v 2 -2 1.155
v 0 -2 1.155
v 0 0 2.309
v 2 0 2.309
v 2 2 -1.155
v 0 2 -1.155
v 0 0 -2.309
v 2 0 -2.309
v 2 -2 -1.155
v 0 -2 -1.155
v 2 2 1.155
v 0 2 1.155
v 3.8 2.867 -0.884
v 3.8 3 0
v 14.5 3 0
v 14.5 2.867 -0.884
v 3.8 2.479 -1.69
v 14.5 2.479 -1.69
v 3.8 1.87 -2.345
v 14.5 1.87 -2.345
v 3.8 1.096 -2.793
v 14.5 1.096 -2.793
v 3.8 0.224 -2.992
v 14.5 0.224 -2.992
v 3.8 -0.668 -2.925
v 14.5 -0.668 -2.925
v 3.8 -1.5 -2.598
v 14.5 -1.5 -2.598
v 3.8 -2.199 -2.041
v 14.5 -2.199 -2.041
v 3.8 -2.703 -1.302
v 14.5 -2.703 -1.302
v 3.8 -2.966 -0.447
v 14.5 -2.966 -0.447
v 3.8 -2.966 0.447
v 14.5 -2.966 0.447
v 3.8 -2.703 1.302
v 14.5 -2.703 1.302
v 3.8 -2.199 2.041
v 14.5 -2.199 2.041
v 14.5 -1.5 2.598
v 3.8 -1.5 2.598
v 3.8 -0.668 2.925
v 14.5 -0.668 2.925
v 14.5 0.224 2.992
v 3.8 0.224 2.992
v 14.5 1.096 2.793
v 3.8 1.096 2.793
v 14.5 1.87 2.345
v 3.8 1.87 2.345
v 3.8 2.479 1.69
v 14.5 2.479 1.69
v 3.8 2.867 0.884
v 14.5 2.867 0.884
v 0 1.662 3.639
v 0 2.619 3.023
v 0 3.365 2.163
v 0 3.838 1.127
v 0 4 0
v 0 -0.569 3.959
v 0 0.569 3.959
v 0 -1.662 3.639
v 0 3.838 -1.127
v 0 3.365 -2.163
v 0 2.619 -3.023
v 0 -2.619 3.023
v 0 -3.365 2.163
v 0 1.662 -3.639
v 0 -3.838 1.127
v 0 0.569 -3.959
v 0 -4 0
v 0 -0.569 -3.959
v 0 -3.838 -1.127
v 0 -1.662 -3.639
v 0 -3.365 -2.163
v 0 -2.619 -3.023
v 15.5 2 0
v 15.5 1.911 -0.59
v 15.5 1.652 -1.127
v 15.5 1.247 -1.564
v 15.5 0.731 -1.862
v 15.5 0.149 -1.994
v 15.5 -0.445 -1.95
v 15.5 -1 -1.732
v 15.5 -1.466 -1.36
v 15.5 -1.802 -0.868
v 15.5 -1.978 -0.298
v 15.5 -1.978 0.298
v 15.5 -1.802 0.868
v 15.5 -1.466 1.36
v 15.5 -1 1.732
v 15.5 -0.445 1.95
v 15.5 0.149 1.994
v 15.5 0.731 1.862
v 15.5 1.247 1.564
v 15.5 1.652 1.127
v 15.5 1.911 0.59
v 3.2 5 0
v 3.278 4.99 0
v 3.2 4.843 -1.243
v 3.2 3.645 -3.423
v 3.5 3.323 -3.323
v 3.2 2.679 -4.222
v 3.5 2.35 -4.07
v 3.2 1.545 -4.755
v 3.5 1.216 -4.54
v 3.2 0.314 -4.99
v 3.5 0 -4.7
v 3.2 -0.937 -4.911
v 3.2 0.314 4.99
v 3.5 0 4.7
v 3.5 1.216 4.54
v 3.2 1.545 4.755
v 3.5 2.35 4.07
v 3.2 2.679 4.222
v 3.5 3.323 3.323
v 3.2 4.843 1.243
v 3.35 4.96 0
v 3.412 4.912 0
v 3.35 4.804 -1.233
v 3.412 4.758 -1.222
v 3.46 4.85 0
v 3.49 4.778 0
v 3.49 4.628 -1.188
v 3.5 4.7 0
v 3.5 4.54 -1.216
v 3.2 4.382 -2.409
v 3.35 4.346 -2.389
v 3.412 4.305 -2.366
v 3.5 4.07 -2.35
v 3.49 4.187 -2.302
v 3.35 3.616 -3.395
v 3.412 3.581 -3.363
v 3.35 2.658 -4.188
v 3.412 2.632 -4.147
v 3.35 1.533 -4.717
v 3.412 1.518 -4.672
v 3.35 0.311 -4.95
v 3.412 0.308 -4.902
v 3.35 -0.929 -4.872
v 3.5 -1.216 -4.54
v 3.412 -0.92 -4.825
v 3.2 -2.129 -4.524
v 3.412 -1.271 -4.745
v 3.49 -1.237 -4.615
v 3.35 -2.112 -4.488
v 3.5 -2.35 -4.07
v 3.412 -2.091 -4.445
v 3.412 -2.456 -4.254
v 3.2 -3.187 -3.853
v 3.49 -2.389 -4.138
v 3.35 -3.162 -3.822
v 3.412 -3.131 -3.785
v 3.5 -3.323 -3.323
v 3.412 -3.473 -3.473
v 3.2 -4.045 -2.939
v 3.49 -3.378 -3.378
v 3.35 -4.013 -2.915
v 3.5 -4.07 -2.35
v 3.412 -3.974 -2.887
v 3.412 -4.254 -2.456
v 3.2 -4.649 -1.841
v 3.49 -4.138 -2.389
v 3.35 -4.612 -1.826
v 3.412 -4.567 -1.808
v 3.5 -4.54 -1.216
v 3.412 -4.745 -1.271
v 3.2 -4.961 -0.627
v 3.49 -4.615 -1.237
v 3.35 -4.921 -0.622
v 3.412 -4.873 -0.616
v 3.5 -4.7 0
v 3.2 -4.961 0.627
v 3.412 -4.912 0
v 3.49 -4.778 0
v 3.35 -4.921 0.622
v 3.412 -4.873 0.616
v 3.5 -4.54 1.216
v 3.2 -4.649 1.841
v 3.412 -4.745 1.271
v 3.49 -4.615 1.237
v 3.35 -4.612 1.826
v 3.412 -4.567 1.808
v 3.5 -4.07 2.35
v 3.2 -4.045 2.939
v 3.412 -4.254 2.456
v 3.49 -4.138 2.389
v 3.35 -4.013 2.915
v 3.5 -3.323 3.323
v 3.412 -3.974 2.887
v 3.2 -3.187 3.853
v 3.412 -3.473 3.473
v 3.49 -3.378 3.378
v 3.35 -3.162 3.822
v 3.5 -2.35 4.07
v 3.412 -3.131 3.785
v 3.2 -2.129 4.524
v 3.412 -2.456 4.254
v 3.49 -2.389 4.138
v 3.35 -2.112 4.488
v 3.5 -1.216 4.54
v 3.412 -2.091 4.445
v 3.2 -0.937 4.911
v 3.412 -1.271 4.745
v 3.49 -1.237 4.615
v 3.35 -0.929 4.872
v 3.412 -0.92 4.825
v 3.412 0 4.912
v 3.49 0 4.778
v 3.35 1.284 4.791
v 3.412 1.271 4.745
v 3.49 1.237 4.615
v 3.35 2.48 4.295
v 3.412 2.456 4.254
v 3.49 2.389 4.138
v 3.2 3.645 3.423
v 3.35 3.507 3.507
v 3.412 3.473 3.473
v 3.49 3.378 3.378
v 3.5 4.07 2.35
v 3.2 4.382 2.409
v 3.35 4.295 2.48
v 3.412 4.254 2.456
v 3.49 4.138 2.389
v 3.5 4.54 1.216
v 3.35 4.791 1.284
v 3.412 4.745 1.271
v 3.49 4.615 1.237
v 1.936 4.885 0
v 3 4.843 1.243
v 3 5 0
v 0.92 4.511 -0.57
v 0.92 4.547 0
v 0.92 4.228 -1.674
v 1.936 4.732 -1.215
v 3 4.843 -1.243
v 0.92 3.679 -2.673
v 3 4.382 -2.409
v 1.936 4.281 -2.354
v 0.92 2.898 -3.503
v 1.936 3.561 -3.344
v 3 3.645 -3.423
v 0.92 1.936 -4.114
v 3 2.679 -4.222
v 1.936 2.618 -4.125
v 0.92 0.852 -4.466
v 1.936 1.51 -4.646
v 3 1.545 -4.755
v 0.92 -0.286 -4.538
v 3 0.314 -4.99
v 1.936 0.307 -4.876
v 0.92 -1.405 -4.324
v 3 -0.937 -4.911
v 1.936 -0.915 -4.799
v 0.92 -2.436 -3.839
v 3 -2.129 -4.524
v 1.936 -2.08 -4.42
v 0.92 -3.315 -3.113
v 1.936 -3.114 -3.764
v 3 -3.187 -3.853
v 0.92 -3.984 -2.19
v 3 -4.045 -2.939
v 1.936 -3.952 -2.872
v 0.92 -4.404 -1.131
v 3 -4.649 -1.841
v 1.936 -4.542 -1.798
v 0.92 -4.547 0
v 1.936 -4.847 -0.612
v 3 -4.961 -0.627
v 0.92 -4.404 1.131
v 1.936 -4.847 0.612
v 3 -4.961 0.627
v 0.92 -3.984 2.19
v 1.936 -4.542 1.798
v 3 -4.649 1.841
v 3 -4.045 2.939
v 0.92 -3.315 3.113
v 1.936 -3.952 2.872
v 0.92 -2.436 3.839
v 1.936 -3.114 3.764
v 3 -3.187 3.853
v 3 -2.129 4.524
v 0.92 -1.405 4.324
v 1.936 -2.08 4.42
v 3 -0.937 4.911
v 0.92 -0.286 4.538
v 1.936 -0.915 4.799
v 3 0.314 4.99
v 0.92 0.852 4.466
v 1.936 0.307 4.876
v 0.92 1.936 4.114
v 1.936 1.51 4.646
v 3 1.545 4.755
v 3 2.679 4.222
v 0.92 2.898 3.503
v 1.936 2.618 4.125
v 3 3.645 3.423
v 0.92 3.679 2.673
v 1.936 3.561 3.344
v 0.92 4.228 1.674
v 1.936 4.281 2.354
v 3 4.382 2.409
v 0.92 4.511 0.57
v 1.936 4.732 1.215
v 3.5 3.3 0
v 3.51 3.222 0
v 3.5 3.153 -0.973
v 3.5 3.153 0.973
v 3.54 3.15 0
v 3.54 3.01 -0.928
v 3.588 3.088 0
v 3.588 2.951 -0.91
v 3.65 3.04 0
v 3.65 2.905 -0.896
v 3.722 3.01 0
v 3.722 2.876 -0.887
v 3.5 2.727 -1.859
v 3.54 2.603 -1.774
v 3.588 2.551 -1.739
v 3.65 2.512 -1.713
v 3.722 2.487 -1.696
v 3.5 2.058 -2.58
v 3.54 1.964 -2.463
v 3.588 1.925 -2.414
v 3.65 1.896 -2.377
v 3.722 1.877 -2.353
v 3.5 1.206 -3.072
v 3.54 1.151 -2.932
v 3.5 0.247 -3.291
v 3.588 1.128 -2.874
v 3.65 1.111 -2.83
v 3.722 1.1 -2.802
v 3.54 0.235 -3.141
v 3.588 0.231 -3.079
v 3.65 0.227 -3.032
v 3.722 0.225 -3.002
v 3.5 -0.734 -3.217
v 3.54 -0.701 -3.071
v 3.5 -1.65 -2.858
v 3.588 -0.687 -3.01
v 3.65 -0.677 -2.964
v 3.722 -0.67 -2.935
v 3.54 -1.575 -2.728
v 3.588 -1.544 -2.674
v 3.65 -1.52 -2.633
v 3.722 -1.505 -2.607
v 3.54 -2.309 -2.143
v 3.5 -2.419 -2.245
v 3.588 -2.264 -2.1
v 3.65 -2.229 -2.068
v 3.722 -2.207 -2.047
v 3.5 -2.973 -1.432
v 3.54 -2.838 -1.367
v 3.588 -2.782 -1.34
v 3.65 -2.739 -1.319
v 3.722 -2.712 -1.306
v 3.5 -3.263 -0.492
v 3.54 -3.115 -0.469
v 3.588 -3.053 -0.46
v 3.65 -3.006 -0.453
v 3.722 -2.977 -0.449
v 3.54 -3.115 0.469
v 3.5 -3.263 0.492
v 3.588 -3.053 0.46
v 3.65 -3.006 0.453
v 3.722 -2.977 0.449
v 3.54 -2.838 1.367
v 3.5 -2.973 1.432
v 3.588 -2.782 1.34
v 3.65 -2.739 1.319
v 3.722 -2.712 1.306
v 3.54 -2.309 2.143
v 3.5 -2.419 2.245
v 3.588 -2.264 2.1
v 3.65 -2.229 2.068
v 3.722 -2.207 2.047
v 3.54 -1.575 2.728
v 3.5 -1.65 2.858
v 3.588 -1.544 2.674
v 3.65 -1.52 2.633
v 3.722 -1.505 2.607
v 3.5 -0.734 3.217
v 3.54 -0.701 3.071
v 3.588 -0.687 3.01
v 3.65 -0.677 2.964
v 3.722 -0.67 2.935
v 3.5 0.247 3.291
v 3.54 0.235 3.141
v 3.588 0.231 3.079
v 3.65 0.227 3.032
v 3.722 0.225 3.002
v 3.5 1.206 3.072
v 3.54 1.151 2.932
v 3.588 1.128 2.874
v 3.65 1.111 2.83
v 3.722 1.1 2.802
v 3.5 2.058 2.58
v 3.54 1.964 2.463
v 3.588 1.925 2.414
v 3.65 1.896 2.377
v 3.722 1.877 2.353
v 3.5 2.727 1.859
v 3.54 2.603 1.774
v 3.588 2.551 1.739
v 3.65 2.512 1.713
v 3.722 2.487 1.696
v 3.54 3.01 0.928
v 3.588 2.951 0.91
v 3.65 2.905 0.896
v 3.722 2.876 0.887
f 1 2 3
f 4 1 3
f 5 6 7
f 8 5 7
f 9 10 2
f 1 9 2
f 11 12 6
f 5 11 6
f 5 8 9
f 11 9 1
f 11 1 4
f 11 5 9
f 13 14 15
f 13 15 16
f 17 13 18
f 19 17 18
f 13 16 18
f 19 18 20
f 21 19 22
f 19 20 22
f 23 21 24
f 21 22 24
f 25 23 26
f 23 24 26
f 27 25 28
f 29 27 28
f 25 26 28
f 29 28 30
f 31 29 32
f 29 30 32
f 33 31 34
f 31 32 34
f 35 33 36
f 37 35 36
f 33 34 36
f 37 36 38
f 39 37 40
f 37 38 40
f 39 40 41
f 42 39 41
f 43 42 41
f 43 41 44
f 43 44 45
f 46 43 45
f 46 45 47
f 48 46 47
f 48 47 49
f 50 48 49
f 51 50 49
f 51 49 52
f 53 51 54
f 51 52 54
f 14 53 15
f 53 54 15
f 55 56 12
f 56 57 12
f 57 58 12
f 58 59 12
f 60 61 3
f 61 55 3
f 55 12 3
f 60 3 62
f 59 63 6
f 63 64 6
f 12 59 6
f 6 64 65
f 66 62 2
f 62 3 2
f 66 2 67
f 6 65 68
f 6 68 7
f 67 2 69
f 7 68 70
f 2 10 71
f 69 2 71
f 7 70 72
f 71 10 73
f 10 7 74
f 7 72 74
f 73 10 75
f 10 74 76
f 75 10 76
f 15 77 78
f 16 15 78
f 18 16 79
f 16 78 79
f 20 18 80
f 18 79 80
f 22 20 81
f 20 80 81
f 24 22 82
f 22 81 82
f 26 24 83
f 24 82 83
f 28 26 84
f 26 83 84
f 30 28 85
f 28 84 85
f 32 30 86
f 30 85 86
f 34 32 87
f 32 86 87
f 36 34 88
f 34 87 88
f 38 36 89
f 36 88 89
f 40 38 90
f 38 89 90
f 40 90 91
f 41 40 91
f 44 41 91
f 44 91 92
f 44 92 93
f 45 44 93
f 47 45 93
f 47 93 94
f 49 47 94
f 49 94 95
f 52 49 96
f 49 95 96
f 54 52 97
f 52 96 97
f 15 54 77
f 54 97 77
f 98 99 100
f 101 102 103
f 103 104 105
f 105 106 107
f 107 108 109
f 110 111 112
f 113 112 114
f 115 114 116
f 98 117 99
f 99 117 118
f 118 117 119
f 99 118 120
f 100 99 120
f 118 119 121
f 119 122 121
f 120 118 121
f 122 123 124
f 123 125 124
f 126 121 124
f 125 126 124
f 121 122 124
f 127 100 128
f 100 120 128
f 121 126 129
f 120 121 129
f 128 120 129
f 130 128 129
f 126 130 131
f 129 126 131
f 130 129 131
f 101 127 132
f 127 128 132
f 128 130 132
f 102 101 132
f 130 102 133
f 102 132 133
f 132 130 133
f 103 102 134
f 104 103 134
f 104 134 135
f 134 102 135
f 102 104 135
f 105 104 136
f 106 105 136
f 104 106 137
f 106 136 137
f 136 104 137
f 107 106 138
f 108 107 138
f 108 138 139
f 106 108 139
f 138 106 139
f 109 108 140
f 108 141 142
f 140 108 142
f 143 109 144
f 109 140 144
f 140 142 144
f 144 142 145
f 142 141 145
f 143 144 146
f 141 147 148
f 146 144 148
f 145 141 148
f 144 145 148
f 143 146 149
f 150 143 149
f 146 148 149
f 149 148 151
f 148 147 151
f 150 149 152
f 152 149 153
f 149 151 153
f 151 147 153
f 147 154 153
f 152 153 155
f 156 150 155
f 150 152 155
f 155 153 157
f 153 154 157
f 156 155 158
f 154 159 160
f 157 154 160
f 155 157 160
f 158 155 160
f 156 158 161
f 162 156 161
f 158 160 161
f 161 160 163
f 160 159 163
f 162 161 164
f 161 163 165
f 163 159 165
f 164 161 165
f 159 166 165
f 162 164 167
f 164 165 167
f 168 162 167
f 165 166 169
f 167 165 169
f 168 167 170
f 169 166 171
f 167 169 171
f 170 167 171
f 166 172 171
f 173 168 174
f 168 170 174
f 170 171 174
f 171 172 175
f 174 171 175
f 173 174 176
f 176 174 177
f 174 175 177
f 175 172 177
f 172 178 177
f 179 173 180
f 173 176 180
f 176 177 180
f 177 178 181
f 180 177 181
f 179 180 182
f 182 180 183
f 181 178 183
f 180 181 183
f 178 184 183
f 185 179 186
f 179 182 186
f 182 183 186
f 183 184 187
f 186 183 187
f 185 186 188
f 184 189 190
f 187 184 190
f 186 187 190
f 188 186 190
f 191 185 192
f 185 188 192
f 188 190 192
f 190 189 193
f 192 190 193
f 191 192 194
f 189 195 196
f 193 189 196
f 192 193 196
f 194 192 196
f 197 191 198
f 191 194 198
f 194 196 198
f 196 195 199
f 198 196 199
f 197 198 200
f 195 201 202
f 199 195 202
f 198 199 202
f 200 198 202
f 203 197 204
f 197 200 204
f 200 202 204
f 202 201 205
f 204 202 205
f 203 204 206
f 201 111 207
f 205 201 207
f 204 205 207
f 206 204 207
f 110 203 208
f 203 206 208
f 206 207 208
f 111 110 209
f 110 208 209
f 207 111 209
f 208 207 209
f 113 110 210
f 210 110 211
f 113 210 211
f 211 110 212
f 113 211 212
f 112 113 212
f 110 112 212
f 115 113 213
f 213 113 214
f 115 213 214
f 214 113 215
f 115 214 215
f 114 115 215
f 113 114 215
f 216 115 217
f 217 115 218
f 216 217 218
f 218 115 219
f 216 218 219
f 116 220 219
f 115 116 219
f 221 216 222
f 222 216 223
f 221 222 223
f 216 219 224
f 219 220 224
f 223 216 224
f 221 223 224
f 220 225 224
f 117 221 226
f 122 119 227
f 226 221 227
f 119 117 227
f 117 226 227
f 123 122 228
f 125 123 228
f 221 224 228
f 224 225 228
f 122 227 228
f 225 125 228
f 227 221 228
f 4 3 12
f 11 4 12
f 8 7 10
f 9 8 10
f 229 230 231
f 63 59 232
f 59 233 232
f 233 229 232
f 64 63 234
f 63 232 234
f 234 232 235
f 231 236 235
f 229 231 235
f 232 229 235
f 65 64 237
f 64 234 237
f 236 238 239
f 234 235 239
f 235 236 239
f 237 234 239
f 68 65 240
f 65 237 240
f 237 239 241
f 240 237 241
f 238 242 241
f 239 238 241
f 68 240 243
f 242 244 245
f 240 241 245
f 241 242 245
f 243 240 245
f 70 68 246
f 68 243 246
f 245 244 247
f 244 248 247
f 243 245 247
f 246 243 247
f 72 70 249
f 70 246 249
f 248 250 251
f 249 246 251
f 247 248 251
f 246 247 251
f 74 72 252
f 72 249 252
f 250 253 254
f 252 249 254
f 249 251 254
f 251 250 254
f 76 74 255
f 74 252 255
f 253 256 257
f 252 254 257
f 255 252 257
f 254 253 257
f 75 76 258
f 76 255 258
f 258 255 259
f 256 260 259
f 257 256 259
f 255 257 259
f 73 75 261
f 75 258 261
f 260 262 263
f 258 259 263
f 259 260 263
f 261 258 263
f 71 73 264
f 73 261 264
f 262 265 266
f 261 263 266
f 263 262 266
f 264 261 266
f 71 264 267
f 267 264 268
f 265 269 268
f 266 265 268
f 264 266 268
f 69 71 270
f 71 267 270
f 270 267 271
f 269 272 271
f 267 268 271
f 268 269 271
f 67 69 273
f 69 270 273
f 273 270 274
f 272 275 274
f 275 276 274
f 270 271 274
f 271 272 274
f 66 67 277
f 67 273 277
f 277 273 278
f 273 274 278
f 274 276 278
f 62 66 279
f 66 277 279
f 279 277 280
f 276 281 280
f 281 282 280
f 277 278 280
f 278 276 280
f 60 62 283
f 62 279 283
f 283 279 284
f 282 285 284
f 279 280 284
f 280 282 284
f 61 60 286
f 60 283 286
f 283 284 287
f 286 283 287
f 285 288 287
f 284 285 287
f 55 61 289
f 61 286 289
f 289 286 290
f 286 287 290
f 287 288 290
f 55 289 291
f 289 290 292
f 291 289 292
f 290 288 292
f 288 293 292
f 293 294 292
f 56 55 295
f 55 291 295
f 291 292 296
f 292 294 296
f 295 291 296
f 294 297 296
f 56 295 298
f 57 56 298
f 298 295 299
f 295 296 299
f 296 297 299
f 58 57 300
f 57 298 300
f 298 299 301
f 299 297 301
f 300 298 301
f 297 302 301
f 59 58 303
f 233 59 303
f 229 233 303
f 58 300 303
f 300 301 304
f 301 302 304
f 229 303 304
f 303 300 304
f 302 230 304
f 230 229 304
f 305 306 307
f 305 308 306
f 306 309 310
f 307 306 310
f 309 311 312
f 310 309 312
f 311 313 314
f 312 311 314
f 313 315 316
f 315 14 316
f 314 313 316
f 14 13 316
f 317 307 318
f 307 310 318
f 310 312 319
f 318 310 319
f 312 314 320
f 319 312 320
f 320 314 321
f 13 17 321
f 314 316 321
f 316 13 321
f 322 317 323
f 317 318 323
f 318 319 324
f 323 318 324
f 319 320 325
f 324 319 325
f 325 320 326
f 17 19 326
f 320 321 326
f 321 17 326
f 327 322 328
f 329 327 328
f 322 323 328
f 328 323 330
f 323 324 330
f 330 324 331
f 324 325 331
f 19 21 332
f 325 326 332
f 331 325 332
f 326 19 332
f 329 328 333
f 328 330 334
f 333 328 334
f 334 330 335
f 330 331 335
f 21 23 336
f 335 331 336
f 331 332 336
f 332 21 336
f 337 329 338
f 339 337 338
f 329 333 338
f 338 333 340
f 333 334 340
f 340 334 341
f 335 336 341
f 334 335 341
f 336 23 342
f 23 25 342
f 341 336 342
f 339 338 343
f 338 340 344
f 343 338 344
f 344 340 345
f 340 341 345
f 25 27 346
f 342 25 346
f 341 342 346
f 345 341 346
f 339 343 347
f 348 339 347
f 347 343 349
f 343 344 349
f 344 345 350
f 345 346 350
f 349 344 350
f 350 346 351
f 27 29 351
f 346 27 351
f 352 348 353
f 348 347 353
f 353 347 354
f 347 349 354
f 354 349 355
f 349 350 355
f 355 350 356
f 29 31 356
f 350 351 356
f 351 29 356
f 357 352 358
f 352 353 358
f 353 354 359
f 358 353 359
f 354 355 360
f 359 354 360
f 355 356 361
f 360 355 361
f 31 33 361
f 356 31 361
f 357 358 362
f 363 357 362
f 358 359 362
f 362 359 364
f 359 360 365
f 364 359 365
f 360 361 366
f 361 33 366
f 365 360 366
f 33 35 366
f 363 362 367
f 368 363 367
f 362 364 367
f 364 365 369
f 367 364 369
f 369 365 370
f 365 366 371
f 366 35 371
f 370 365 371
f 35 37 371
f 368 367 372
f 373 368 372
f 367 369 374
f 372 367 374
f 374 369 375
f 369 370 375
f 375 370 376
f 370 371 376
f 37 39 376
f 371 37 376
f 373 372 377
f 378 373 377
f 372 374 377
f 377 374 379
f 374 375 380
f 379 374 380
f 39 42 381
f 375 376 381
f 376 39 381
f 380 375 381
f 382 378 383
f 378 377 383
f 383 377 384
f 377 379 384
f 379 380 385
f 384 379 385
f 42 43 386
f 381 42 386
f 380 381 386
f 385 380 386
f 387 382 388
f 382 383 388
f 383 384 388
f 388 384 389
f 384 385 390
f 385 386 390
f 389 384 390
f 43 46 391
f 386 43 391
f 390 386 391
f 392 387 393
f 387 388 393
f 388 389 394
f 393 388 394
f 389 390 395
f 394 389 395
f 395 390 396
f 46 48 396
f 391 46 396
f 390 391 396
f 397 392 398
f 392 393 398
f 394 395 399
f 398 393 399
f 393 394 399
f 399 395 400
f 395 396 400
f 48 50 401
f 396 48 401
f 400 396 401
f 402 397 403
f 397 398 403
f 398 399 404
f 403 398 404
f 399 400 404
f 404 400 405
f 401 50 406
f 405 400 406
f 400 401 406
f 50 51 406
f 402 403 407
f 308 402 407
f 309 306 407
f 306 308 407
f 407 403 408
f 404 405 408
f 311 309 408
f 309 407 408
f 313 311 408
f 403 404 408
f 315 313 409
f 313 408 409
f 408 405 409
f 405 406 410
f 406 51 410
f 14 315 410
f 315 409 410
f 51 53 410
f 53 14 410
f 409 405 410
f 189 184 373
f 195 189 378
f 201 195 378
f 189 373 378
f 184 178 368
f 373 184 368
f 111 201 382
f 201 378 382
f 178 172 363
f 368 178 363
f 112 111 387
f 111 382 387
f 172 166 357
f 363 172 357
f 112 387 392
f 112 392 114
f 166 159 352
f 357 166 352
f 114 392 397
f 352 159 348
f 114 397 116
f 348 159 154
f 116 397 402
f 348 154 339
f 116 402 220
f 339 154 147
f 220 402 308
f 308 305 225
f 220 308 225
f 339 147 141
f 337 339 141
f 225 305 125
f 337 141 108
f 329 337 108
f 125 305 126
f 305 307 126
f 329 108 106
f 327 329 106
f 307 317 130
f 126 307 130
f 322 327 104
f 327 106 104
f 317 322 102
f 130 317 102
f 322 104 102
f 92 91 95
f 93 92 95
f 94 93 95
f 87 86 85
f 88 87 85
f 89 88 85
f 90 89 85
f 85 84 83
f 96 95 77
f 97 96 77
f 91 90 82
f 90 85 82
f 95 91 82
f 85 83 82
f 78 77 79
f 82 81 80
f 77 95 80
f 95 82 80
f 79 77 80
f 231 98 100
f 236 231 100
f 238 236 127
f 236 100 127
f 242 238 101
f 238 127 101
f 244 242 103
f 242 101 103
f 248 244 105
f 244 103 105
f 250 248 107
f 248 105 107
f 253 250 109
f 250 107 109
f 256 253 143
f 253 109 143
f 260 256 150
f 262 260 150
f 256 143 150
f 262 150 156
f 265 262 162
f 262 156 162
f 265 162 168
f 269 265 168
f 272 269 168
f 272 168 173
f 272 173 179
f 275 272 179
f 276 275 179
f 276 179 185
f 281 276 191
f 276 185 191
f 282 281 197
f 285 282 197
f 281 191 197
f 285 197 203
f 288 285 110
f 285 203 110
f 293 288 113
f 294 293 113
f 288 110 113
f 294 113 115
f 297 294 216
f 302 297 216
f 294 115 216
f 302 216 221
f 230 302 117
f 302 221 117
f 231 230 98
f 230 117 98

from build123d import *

# Parameters (mm, degrees)
CUT_EXTRUDE_1_DEPTH = 2
FILLET_1_R          = 0.3
CHAMFER_1_SIZE      = 1


with BuildPart() as part:
    # Эскиз1 → Повернуть1 (revolve)
    with BuildSketch(Plane.XY):
        with BuildLine():
            Line((0, 0), (0, 4))
            ThreePointArc((0, 4), (1.41886117, 4.74341649), (3, 5))
            Line((3, 5), (3.5, 5))
            Line((3.5, 5), (3.5, 3))
            Line((3.5, 3), (15.5, 3))
            Line((15.5, 3), (15.5, 0))
            Line((15.5, 0), (0, 0))
        make_face()
    revolve(axis=Axis((15.5, 0, 0), (-1, 0, 0)))

    # Эскиз2 → Вырез-Вытянуть1 (cut)
    with BuildSketch(Plane.ZY):
        Polygon((1.154700538, 2), (-1.154700538, 2), (-2.309401077, 0), (-1.154700538, -2), (1.154700538, -2), (2.309401077, 0), align=None)
    extrude(amount=-CUT_EXTRUDE_1_DEPTH, mode=Mode.SUBTRACT)

    # Скругление1
    fillet_1_edges = [part.edges().sort_by_distance(p)[0] for p in [
        (3.5, -3, 0),
        (3.5, -5, 0),
    ]]
    fillet(fillet_1_edges, radius=FILLET_1_R)

    # Фаска1
    chamfer_1_edges = [part.edges().sort_by_distance(p)[0] for p in [
        (15.5, -3, 0),
    ]]
    chamfer(chamfer_1_edges, length=CHAMFER_1_SIZE)


solid = part.part
